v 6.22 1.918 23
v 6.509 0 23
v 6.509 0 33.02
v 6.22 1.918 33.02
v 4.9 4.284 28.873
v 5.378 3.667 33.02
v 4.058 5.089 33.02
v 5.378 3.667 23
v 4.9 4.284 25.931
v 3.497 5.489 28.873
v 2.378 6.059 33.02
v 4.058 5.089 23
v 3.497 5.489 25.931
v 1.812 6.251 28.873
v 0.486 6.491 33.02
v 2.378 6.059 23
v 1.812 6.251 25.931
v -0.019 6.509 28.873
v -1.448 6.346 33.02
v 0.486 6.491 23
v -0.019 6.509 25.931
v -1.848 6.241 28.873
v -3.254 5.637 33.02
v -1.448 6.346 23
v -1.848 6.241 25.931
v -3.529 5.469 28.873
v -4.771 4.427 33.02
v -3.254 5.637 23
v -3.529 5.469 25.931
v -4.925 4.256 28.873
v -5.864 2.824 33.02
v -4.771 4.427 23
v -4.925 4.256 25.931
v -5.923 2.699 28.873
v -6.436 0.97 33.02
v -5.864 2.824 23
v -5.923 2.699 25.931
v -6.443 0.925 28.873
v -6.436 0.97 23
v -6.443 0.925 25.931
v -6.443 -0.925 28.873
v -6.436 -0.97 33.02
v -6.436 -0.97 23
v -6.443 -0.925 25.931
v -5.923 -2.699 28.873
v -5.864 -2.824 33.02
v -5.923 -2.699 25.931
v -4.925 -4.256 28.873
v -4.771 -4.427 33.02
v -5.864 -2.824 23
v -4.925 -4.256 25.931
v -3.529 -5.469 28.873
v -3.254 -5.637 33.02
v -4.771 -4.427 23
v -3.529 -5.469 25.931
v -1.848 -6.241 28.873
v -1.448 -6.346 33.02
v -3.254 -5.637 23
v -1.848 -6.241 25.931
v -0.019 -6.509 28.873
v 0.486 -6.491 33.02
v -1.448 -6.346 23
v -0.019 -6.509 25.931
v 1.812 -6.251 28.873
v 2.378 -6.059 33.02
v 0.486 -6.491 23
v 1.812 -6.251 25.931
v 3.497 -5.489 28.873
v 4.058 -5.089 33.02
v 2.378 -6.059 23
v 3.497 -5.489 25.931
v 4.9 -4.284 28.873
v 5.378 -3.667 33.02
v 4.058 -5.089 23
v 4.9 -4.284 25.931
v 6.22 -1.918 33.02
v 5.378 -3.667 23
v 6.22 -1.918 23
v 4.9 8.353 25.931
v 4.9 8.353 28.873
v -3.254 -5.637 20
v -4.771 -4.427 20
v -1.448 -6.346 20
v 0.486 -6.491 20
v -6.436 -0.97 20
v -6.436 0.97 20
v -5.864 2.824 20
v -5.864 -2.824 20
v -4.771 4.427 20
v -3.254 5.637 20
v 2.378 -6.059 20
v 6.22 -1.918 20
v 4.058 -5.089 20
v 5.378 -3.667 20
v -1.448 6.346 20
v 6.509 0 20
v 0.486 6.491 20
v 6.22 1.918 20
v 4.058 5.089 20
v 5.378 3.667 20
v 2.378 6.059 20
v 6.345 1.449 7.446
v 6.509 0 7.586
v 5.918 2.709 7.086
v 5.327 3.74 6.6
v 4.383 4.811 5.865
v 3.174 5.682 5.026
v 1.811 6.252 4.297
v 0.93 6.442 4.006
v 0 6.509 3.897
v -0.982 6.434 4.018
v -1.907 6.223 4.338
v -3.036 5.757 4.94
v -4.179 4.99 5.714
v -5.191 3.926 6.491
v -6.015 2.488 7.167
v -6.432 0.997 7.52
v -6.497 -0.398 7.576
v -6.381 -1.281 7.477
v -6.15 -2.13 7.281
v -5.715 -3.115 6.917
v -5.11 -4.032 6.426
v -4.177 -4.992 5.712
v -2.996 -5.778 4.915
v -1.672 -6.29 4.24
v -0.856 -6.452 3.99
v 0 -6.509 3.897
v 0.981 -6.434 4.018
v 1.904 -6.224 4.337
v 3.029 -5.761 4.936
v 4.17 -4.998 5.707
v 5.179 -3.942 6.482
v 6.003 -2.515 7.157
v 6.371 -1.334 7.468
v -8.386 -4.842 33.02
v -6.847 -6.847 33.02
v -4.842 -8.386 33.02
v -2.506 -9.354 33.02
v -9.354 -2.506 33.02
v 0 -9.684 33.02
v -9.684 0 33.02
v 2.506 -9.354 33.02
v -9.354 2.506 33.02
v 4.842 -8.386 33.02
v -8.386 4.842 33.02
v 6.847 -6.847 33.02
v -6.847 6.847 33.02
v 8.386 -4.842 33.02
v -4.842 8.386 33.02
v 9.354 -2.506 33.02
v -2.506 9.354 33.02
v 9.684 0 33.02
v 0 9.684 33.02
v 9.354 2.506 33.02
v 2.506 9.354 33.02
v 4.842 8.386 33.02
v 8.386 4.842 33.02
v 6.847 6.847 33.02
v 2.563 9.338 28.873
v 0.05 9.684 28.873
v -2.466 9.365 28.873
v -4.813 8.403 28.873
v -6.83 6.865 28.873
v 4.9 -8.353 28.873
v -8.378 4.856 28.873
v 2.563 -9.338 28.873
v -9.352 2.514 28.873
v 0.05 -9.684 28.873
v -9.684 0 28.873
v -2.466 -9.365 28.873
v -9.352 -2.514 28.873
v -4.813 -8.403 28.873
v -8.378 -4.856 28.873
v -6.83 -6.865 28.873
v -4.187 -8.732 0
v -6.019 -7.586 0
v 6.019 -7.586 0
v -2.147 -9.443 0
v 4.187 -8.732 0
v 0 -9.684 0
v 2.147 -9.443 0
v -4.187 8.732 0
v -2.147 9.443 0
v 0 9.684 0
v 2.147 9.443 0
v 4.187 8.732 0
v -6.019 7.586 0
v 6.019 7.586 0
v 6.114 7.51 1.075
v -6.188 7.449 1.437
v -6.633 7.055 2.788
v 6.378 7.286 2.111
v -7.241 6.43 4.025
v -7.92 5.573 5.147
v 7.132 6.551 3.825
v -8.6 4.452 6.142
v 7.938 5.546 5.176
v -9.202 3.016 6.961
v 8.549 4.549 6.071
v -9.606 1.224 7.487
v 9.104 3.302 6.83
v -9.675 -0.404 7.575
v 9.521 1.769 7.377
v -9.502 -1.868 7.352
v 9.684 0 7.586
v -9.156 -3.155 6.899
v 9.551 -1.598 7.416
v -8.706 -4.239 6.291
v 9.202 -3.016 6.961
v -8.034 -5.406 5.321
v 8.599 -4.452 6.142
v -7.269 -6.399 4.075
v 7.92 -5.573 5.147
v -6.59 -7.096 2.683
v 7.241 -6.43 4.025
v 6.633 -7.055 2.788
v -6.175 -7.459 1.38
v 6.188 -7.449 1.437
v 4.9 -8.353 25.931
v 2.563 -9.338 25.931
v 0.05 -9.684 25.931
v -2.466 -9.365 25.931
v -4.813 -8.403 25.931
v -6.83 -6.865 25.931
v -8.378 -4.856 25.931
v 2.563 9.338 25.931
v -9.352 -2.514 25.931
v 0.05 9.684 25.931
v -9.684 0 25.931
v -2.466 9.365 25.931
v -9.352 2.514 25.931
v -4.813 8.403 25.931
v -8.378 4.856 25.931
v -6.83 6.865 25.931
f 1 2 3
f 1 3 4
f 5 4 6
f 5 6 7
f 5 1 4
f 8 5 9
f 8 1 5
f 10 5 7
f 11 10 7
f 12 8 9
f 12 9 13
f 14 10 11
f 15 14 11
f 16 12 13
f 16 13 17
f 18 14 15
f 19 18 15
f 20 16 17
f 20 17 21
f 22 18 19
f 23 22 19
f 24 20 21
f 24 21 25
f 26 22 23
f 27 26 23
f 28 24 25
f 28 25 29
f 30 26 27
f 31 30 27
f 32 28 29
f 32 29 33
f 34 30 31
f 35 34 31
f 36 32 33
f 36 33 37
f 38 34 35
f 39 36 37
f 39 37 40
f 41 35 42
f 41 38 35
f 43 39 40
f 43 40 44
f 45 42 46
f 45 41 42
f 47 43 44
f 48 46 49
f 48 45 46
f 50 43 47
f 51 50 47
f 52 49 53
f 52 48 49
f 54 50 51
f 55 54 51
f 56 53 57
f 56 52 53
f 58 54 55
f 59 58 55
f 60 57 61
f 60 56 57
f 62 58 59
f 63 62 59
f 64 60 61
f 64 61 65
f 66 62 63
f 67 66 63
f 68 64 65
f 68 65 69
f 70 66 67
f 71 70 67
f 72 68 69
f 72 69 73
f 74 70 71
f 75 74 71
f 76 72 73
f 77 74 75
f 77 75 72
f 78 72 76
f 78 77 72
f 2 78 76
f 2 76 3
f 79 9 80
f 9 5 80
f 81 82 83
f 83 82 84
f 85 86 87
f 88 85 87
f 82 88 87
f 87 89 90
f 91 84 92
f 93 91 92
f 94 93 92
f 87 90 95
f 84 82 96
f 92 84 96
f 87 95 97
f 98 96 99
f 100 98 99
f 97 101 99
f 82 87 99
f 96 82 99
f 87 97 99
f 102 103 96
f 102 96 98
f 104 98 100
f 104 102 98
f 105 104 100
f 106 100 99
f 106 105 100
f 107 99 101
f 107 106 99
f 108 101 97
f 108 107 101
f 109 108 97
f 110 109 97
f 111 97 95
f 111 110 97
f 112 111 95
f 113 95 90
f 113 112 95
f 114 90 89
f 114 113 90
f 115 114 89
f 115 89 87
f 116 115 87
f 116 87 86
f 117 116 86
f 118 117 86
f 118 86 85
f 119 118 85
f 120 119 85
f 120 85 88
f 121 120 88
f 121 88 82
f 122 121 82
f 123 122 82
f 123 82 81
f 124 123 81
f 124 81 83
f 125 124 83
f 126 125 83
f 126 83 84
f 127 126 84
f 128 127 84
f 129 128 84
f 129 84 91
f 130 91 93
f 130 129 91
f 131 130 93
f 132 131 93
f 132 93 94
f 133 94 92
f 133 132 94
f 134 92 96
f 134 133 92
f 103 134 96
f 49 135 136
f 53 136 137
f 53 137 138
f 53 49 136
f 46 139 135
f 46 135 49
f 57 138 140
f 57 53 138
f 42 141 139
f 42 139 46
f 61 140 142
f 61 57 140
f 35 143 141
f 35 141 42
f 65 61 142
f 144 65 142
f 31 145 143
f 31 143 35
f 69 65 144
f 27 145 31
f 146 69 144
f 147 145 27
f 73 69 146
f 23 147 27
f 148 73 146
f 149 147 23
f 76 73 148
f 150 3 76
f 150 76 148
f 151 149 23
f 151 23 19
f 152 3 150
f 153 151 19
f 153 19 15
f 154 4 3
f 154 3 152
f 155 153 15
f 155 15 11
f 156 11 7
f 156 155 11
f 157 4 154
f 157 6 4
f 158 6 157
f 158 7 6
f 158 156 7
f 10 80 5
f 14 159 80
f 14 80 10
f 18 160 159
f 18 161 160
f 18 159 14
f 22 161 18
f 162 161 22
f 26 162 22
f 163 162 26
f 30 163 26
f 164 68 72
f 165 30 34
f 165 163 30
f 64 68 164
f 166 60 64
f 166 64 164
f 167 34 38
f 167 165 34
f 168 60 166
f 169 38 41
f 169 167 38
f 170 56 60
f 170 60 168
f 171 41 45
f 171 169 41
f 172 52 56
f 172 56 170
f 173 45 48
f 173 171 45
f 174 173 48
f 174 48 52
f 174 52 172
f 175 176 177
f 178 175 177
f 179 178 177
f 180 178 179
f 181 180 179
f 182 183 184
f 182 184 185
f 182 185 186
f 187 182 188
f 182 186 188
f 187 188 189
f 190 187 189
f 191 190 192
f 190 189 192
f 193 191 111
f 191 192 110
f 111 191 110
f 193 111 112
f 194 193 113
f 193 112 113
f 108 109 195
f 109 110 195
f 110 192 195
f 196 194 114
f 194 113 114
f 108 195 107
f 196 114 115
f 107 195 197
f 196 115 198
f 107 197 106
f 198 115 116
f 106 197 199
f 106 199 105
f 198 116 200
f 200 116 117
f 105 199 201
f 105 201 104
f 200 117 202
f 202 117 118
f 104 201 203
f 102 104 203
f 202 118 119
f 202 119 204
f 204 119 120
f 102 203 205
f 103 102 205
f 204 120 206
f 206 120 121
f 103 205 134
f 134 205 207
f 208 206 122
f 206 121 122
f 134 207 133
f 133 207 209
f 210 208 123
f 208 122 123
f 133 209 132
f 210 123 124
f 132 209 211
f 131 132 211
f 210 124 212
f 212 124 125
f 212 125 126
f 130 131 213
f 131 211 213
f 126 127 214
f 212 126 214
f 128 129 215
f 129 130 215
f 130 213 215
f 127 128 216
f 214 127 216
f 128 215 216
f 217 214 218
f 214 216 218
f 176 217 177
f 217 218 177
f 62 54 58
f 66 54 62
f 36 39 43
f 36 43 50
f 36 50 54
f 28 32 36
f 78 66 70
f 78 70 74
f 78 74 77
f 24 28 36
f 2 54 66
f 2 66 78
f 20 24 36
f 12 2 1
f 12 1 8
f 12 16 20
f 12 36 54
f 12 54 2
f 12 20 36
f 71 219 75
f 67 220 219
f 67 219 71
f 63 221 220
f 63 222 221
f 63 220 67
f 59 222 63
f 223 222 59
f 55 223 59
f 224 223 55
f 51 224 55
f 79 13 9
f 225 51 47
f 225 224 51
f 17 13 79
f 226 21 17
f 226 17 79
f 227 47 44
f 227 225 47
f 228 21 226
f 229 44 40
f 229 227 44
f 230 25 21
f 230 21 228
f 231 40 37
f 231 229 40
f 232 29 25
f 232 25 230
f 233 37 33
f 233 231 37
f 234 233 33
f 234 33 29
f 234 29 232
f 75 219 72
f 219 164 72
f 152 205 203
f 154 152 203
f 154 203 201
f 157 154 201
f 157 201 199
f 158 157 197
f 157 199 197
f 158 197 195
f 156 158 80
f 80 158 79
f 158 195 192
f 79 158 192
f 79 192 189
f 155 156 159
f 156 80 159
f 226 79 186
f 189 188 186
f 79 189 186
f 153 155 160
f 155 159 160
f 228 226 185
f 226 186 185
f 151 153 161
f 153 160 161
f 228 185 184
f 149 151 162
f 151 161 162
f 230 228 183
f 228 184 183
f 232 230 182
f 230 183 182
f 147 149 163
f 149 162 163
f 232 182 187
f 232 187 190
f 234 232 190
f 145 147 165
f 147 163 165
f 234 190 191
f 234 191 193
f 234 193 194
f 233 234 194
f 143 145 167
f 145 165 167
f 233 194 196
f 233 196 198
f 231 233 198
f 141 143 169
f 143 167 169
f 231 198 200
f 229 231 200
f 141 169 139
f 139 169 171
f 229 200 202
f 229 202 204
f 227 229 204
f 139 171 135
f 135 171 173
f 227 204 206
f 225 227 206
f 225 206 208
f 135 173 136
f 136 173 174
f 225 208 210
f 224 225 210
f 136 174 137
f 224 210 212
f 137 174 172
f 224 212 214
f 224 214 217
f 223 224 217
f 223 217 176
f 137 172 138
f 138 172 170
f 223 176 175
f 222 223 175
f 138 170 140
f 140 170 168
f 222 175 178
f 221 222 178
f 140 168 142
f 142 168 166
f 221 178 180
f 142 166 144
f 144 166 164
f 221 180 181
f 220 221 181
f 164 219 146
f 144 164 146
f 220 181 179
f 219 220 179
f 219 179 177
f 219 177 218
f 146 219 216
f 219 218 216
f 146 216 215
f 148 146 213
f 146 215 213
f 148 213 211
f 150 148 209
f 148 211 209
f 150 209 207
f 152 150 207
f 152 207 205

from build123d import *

# Parameters (mm, degrees)
F0_R      = 9.68375
F0_R_2    = 6.50875
F1_DEPTH  = 33.02
F3_DEPTH  = 25
F4_DEPTH  = 54.6
F6_R      = 6.50875
F7_DEPTH  = 3
F9_DEPTH  = 25
F10_DEPTH = 4.9


with BuildPart() as f1:
    # F0 (on Top) → F1 (new body)
    with BuildSketch(Plane.XY):
        Circle(F0_R)
        Circle(F0_R_2, mode=Mode.SUBTRACT)
    extrude(amount=F1_DEPTH)

    # F2 (on Right) → F3 (cut)
    with BuildSketch(Plane.YZ):
        with BuildLine():
            ThreePointArc((7.586009, 0), (0, 7.586009), (-7.586009, 0))
            Line((-7.586009, 0), (7.586009, 0))
        make_face()
    extrude(amount=-F3_DEPTH, mode=Mode.SUBTRACT)

    # F2 (on Right) → F4 (cut)
    with BuildSketch(Plane.YZ):
        with BuildLine():
            ThreePointArc((7.586009, 0), (0, 7.586009), (-7.586009, 0))
            Line((-7.586009, 0), (7.586009, 0))
        make_face()
    extrude(amount=F4_DEPTH, mode=Mode.SUBTRACT)

    # F6 (on offset) → F7 (join)
    with BuildSketch(Plane.XY.offset(20)):
        Circle(F6_R)
    extrude(amount=F7_DEPTH)

    # F8 (on Right) → F9 (cut)
    with BuildSketch(Plane.YZ):
        Polygon((10.249765, 25.931381), (10.093447, 28.872697), (-10.251949, 28.872697), (-10.251949, 25.931381), align=None)
    extrude(amount=-F9_DEPTH, mode=Mode.SUBTRACT)

    # F8 (on Right) → F10 (cut)
    with BuildSketch(Plane.YZ):
        Polygon((10.249765, 25.931381), (10.093447, 28.872697), (-10.251949, 28.872697), (-10.251949, 25.931381), align=None)
    extrude(amount=F10_DEPTH, mode=Mode.SUBTRACT)


solid = f1.part
